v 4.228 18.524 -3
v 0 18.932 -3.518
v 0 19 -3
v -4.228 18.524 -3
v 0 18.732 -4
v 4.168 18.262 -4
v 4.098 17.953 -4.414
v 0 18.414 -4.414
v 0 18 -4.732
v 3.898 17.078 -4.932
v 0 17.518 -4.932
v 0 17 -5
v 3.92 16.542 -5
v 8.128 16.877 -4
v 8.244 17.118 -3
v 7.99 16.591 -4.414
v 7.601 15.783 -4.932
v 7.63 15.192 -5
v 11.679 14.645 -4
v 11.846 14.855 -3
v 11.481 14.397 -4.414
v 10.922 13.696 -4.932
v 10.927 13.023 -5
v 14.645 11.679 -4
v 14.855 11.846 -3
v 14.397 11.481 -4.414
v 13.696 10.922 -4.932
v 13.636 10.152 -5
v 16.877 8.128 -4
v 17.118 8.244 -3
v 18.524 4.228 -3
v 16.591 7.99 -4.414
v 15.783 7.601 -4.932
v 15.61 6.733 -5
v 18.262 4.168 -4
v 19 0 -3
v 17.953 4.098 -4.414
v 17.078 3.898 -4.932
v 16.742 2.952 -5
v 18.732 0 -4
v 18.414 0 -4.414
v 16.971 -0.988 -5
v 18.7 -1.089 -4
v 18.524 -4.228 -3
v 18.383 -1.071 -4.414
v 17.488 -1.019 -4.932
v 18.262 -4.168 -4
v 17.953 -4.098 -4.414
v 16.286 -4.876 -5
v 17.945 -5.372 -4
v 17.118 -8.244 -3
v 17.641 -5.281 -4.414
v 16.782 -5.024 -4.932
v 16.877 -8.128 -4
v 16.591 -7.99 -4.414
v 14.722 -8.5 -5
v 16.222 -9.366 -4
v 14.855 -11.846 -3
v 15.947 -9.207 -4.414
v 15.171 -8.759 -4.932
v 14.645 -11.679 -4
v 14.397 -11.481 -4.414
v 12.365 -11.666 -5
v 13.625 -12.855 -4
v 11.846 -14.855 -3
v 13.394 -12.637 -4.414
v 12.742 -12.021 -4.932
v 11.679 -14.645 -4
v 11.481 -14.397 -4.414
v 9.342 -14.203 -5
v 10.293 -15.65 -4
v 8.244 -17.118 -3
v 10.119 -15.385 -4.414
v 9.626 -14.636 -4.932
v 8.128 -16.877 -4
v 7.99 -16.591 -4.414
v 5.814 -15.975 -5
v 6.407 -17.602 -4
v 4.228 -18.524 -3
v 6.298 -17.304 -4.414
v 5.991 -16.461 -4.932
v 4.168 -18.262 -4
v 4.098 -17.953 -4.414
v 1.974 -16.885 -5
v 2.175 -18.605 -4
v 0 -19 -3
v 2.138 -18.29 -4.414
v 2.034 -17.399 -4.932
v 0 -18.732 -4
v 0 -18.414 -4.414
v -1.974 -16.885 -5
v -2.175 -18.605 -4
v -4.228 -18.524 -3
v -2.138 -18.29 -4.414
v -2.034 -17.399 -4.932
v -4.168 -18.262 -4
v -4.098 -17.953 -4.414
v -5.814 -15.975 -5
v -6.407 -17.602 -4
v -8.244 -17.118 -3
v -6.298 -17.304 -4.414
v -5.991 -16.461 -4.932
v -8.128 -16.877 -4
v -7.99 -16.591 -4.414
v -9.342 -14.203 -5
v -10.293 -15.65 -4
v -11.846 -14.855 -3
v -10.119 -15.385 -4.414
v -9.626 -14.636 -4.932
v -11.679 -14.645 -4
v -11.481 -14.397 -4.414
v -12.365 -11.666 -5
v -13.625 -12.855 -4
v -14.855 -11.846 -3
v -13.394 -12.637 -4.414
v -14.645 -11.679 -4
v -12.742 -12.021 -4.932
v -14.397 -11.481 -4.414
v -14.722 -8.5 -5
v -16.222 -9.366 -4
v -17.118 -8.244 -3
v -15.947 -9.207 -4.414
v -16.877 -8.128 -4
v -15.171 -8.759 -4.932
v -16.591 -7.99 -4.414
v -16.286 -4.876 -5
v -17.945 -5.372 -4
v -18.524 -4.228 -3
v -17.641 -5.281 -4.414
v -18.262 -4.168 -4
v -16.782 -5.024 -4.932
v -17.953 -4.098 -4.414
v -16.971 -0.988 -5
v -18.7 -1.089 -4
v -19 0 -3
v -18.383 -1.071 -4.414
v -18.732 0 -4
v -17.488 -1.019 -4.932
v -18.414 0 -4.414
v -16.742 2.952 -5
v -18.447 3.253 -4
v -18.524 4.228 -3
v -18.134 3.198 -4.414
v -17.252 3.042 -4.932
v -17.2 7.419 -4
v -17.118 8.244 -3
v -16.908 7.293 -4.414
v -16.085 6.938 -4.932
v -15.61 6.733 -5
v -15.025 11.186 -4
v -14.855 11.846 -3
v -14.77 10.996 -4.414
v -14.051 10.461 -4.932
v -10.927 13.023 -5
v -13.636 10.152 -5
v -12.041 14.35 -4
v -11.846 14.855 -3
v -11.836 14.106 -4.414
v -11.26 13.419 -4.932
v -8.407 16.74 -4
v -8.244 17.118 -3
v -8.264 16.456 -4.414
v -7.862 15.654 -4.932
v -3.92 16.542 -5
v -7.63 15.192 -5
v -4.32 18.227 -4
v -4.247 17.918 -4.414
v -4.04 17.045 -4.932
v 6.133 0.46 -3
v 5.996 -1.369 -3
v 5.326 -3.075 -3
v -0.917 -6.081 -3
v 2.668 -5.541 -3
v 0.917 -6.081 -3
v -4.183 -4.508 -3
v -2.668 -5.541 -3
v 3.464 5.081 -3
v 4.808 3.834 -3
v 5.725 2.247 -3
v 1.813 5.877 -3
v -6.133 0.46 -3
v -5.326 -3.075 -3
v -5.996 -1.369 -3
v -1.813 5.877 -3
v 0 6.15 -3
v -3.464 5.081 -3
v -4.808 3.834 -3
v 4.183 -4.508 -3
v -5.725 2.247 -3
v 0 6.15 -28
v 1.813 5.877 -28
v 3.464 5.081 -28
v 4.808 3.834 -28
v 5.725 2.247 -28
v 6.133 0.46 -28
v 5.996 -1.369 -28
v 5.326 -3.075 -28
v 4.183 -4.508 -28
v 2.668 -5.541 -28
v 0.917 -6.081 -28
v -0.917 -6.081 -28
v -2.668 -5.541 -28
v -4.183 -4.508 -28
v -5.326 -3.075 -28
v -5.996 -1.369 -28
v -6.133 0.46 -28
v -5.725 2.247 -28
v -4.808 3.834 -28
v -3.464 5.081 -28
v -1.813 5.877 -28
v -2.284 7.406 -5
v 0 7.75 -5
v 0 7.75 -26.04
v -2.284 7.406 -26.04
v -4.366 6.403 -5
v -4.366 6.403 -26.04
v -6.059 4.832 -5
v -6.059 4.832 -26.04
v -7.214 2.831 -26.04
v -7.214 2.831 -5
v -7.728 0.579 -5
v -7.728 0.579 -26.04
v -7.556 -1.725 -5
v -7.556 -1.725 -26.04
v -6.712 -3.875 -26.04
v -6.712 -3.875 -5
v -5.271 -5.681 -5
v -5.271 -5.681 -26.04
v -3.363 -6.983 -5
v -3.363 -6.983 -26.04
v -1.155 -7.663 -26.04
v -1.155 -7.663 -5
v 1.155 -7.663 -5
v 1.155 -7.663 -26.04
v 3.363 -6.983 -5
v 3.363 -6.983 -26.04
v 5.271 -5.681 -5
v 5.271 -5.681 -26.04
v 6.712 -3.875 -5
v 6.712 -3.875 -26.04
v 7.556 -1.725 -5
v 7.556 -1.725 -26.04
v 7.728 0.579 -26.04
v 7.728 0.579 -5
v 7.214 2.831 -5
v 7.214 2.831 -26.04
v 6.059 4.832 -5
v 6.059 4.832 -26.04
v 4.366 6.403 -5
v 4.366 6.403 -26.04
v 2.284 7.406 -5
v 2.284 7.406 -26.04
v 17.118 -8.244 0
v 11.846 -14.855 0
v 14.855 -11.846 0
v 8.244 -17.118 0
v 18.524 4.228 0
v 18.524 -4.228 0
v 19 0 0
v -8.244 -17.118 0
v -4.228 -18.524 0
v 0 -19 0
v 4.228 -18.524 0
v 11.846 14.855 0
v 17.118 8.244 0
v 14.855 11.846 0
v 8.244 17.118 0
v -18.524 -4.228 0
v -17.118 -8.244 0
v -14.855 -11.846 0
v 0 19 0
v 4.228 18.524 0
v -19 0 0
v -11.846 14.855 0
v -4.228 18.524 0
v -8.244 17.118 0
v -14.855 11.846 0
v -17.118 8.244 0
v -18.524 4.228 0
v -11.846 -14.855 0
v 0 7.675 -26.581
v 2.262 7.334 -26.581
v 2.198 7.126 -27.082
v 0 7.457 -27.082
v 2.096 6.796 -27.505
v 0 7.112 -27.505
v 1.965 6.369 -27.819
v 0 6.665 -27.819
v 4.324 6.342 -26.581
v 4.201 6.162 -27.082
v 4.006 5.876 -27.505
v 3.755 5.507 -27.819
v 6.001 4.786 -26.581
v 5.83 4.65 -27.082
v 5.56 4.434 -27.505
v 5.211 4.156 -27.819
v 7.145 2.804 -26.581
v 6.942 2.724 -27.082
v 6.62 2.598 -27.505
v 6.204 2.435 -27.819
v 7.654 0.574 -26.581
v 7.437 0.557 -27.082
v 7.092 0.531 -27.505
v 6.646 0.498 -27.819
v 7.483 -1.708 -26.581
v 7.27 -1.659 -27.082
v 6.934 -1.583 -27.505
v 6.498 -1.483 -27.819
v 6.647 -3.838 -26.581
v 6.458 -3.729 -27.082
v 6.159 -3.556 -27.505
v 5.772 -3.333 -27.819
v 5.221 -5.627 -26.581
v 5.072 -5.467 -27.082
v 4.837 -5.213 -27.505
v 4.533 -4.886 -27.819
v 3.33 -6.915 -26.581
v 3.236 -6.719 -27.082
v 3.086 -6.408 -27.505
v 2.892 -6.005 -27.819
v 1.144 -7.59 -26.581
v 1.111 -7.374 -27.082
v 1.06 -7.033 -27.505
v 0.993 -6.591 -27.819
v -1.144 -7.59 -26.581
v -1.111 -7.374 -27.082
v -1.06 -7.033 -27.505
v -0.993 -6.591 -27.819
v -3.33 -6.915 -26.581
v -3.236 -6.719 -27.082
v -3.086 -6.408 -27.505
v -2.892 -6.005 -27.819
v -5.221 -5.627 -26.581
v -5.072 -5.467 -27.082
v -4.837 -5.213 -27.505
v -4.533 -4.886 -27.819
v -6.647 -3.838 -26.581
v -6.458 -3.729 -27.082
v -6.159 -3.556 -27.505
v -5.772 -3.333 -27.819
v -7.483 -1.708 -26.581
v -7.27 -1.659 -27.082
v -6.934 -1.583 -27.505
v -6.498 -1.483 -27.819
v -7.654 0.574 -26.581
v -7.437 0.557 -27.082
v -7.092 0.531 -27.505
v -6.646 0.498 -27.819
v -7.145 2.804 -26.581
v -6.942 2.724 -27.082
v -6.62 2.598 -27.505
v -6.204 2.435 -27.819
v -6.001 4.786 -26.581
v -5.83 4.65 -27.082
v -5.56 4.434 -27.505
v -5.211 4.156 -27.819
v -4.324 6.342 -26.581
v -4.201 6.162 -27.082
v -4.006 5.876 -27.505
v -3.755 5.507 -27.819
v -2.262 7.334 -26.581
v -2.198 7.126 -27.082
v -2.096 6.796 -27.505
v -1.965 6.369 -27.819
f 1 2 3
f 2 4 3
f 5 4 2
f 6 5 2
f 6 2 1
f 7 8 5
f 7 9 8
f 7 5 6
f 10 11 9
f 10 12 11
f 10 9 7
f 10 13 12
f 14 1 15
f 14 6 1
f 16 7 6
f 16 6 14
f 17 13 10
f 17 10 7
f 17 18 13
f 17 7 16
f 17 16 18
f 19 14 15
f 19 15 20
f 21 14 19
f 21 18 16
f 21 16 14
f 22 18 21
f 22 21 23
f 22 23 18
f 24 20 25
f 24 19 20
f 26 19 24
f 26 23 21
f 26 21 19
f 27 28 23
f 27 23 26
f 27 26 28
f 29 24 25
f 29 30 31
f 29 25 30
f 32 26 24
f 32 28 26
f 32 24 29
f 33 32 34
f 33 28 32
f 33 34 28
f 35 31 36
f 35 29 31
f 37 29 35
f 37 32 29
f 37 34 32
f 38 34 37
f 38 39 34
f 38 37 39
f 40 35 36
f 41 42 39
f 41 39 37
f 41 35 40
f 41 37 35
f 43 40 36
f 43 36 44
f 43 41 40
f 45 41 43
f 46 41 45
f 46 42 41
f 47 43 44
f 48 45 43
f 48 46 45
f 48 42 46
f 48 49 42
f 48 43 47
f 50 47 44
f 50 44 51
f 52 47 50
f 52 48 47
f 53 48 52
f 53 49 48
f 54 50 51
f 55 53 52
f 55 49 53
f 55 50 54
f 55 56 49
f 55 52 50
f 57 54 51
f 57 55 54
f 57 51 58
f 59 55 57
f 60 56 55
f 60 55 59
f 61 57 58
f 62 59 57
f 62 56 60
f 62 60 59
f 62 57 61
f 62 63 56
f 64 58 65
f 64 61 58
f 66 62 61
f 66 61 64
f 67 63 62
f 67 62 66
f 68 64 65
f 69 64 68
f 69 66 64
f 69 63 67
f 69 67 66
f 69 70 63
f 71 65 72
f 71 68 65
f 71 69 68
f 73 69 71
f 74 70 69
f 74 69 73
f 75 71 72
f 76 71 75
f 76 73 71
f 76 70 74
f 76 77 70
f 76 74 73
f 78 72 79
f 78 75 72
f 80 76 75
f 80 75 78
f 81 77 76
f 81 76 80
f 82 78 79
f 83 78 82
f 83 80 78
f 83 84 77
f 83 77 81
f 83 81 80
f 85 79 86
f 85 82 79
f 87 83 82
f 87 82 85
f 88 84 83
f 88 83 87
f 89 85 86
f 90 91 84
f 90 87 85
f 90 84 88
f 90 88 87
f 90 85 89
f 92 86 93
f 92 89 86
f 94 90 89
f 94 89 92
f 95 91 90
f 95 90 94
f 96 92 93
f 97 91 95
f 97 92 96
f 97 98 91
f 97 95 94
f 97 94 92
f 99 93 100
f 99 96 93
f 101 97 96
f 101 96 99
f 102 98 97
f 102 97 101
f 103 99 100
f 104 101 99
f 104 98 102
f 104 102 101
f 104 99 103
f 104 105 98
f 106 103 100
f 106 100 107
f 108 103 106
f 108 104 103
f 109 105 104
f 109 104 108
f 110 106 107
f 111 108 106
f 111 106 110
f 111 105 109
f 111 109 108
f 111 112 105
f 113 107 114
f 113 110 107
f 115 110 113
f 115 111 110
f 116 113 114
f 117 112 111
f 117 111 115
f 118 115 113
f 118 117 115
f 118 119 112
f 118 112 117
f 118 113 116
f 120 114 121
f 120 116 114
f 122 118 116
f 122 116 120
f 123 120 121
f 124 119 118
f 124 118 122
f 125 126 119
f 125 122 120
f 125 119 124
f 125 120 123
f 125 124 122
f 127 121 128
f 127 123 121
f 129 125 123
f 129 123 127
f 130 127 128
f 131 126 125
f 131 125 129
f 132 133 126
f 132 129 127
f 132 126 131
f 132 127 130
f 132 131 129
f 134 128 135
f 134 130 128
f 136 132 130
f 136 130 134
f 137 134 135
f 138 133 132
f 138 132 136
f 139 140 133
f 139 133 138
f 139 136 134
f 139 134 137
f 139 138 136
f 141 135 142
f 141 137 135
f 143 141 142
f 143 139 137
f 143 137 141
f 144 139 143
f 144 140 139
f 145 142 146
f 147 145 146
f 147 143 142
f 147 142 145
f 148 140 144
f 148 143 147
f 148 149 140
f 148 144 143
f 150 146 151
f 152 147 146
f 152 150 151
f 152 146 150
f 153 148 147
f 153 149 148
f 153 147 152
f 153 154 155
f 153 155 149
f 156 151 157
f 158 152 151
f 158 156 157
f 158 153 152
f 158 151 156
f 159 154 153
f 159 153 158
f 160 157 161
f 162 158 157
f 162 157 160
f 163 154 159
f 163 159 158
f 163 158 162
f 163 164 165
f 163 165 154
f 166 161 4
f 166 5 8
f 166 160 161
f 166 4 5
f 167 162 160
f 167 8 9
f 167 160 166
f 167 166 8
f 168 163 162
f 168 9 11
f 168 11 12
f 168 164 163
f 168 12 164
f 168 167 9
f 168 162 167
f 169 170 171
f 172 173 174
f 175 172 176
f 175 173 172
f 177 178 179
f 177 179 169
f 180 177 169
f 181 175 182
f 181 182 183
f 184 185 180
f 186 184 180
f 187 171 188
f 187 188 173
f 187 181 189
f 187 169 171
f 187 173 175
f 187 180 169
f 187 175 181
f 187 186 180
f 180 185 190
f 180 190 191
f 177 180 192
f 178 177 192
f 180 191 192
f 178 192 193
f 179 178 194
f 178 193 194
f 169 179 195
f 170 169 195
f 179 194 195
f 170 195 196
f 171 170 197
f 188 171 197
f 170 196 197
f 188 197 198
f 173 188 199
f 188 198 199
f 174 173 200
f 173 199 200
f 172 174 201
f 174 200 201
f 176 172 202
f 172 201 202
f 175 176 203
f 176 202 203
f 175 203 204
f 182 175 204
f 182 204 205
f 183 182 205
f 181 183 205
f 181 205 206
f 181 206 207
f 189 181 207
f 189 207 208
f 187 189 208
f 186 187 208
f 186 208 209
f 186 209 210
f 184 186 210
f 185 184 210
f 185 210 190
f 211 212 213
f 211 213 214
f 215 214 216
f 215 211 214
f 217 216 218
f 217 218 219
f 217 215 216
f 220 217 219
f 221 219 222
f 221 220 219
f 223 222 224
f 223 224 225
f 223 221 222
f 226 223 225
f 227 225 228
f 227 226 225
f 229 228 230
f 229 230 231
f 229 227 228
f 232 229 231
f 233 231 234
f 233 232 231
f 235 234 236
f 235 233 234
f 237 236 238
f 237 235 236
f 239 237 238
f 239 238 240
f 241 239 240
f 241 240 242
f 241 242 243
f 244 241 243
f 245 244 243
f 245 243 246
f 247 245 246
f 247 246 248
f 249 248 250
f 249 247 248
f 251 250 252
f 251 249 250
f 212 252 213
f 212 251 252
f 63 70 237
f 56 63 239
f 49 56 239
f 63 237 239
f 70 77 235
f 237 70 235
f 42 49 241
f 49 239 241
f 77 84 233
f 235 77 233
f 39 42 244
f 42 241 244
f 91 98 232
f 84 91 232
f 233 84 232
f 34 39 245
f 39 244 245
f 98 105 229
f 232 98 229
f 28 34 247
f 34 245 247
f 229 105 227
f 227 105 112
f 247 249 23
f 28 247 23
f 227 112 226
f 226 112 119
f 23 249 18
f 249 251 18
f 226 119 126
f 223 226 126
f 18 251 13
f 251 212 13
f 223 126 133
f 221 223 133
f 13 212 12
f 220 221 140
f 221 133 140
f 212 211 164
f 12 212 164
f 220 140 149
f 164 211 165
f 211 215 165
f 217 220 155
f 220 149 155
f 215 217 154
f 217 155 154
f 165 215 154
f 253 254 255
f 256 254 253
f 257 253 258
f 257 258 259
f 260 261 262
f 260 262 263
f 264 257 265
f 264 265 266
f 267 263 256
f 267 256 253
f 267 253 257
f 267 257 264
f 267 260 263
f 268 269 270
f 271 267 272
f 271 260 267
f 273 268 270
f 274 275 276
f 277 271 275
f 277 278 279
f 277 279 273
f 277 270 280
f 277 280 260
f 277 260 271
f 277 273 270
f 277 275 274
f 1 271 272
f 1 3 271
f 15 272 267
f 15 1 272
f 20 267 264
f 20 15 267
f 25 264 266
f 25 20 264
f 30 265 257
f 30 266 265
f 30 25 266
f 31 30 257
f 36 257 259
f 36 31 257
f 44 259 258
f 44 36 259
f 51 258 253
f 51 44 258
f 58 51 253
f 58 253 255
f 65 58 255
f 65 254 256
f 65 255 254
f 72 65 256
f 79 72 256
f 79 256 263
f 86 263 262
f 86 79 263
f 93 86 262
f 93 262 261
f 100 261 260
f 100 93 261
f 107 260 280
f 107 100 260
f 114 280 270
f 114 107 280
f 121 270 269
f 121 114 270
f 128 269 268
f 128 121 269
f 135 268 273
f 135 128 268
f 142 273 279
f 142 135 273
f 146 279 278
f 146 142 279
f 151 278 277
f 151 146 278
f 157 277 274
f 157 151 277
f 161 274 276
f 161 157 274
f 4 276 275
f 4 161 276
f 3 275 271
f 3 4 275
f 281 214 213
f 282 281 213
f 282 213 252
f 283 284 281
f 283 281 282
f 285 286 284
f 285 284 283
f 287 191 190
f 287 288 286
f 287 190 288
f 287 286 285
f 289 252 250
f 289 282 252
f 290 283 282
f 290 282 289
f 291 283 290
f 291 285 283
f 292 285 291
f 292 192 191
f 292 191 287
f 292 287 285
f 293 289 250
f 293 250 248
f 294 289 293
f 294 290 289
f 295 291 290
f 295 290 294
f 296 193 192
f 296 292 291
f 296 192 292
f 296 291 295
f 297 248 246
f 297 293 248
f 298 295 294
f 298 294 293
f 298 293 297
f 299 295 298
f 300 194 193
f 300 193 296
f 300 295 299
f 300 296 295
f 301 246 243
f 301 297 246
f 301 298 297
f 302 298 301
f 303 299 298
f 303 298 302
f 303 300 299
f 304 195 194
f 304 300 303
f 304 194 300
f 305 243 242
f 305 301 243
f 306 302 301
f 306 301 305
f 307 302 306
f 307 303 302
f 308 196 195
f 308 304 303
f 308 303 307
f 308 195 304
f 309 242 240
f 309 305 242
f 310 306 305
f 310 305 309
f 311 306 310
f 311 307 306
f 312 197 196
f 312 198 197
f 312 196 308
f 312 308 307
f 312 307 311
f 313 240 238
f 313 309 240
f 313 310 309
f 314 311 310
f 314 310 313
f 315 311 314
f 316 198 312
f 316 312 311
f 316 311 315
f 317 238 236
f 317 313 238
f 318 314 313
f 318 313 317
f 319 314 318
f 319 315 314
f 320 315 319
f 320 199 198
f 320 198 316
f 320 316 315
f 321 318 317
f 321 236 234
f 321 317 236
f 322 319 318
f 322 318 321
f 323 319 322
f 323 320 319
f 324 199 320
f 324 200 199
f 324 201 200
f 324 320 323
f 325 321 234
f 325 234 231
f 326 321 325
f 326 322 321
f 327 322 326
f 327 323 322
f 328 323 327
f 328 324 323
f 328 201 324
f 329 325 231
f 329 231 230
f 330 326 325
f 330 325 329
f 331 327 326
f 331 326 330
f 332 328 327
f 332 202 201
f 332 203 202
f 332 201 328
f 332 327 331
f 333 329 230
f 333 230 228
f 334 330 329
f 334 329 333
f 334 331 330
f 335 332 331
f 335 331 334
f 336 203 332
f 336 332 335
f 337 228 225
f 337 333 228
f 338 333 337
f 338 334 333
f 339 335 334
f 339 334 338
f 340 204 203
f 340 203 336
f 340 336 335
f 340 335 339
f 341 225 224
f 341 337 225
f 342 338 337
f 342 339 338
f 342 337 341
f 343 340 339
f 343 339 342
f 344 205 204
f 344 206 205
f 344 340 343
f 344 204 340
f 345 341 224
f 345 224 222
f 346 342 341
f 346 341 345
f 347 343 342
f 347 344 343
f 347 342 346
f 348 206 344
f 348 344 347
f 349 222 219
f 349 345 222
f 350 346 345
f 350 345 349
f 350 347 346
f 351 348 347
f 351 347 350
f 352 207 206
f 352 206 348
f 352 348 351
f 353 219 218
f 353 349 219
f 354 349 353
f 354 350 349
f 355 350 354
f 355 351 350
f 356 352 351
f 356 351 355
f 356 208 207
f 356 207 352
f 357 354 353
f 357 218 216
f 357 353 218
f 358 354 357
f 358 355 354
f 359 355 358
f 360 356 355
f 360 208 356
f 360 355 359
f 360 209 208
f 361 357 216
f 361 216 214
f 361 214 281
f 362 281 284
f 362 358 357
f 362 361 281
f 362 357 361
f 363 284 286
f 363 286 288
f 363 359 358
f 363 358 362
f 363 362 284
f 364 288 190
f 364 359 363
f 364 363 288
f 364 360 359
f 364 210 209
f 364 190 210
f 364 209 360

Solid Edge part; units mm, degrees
sketch "Sketch1" plane through (0, 0, 0) normal (1, 0, 0) x (0, 1, 0)
  line L0 (0, 0) -> (19, 0)
  line L1 (19, 0) -> (19, -3)
  arc A0 (19, -3) -> (17, -5) centre (17, -3) cw
  line L2 (17, -5) -> (7.75, -5)
  line L3 (7.75, -28) -> (7.75, -5)
  line L4 (7.75, -28) -> (0, -28)
  line L5 (0, 0) -> (0, -28)
revolve "RevolvedProtrusion1" add sketch "Sketch1" angle 360 about axis through (0, 0, 0) along (0, 0, 1)
sketch "Sketch2" plane through (0, 0, -28) normal (0, 0, -1) x (0, 1, 0)
  circle A0 centre (0, 0) radius 6.15
extrude "Cutout1" cut sketch "Sketch2" against normal blind 25
fillet "Lekerekítés_1" radius 2 1 edges at (-7.75, 0, -28)
properties material "Polipropilén, általános rendeltetésű"
